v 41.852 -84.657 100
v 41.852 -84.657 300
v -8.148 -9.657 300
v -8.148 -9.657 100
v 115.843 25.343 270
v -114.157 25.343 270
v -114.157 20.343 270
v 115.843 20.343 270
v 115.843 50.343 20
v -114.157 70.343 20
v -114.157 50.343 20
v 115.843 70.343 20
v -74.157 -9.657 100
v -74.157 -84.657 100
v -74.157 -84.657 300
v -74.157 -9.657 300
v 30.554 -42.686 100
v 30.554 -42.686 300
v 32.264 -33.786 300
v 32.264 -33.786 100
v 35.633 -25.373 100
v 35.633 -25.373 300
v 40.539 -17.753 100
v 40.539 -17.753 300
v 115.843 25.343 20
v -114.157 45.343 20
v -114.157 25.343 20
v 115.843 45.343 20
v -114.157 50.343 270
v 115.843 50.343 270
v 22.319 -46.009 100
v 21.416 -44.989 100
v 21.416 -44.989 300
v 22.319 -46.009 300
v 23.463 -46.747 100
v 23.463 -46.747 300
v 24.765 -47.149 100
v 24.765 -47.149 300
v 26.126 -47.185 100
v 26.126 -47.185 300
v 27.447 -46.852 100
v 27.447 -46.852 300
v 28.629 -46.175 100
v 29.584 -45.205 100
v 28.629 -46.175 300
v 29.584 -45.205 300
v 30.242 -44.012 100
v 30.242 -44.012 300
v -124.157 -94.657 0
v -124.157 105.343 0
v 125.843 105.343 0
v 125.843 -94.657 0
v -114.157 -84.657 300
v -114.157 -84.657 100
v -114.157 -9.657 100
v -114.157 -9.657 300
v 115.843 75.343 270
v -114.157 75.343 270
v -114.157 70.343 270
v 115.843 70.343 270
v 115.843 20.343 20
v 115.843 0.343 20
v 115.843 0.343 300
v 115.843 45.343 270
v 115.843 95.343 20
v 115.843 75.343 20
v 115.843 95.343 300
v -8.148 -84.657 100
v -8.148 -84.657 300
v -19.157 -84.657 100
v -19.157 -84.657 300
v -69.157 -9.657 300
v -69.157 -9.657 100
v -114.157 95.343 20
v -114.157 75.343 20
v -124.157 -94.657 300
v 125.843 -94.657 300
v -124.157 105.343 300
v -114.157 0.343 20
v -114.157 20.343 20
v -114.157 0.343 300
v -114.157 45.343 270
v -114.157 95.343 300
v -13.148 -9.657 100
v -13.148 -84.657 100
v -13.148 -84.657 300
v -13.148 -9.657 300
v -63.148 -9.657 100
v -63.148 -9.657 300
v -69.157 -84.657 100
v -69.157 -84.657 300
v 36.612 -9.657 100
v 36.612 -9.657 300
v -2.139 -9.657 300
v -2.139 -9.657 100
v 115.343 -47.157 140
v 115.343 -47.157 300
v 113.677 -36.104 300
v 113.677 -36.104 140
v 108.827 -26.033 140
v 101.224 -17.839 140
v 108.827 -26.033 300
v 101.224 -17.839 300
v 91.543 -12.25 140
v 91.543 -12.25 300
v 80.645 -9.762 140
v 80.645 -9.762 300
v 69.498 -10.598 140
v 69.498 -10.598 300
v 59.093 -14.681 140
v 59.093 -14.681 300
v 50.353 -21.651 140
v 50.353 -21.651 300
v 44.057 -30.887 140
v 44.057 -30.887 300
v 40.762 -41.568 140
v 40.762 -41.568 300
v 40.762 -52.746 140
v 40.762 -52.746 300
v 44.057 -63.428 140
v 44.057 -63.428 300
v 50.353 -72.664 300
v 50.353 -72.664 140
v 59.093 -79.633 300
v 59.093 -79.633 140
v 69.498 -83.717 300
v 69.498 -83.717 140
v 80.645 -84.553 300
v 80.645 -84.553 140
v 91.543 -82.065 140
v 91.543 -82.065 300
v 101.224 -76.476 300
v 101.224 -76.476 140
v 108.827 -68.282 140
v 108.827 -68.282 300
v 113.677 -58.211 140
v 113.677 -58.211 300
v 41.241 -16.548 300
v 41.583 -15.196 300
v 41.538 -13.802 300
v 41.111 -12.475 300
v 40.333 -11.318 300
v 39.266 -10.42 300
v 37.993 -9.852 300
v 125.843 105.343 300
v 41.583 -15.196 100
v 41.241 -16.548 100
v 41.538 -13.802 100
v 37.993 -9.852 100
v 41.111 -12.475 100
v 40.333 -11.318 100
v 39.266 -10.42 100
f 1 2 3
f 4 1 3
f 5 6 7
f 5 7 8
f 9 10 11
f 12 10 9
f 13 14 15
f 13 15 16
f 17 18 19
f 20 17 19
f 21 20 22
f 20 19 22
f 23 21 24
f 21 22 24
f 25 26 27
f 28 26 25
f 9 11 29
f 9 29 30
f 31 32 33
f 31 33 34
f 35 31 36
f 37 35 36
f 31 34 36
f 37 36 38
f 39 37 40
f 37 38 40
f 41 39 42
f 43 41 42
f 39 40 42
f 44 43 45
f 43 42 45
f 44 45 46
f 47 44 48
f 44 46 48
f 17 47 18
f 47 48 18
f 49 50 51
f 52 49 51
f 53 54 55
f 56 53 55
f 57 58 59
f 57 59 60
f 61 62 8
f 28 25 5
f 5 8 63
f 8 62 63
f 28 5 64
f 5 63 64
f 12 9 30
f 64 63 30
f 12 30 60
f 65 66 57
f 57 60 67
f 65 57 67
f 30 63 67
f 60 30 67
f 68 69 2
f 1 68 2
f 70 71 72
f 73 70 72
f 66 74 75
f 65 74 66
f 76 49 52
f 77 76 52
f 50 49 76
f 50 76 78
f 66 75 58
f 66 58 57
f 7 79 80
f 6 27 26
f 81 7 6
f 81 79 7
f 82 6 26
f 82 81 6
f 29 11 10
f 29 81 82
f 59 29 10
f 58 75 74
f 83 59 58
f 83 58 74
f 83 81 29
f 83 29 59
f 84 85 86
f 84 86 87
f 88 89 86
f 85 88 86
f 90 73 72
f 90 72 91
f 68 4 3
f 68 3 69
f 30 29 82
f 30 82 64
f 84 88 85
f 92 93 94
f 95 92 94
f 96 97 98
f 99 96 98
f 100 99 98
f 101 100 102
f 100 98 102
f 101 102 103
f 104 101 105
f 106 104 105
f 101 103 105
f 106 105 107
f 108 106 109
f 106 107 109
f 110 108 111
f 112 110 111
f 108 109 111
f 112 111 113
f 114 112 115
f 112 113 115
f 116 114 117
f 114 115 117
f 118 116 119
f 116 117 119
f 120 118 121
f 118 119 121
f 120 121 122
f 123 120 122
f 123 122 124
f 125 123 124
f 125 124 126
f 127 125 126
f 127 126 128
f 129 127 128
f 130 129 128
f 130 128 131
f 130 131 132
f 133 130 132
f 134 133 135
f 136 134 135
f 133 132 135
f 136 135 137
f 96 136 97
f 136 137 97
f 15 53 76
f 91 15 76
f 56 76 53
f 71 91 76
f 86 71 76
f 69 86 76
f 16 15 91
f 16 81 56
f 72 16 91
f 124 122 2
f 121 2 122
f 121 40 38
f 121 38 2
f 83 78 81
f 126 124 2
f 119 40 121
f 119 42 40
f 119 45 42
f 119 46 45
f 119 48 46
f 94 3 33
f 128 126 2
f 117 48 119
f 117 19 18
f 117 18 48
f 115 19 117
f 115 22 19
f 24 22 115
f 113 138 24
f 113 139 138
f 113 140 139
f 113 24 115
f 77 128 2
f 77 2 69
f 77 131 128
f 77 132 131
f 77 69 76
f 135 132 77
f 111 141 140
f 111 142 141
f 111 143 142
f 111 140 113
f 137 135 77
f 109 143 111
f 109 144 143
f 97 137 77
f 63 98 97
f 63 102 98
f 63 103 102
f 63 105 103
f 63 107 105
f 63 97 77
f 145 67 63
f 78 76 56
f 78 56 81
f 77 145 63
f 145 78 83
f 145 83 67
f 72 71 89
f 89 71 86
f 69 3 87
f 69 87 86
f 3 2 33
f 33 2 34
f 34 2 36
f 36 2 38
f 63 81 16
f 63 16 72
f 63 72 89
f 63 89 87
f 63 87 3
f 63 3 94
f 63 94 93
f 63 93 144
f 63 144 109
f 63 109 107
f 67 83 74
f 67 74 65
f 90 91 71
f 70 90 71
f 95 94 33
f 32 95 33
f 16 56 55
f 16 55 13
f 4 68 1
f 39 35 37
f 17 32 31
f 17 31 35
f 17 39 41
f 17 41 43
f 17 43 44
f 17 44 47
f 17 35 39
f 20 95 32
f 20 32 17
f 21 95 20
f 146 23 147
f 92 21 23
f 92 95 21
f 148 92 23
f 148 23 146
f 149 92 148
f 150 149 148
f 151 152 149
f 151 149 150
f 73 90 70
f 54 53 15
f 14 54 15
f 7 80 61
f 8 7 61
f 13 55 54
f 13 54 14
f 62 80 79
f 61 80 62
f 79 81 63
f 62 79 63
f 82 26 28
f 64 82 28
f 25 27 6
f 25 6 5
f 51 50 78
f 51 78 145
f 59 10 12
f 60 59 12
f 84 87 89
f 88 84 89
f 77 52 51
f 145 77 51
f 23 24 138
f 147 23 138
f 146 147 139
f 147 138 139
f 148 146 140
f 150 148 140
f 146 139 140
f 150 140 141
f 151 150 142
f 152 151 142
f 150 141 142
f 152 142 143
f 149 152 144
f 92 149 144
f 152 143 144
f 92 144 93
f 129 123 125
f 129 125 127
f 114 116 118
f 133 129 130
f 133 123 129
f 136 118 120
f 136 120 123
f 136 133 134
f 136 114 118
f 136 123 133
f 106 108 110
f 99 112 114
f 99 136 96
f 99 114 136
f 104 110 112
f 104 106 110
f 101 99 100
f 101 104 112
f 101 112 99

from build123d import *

# Parameters (mm, degrees)
F0_W     = 250
F0_H     = 200
F1_DEPTH = 300
F2_W     = 230
F2_H     = 20
F3_DEPTH = 280
F4_W     = 230
F4_H     = 55
F5_DEPTH = 30
F6_R     = 37.5
F7_DEPTH = 160
F6_W     = 40
F6_H     = 75
F8_DEPTH = 200


with BuildPart() as f1:
    # F0 (on Top) → F1 (new body)
    with BuildSketch(Plane.XY):
        with Locations((0.84289, 5.342618)):
            Rectangle(F0_W, F0_H)
    extrude(amount=F1_DEPTH)

    # F2 (on face) → F3 (cut)
    with BuildSketch(Plane.XY.offset(300)):
        with Locations((0.84289, 85.342618)):
            Rectangle(F2_W, F2_H)
        with Locations((0.84289, 60.342618)):
            Rectangle(F2_W, F2_H)
        with Locations((0.84289, 35.342618)):
            Rectangle(F2_W, F2_H)
        with Locations((0.84289, 10.342618)):
            Rectangle(F2_W, F2_H)
    extrude(amount=-F3_DEPTH, mode=Mode.SUBTRACT)

    # F4 (on face) → F5 (cut)
    with BuildSketch(Plane.XY.offset(300)):
        with Locations((0.84289, 47.842618)):
            Rectangle(F4_W, F4_H)
    extrude(amount=-F5_DEPTH, mode=Mode.SUBTRACT)

    # F6 (on face) → F7 (cut)
    with BuildSketch(Plane.XY.offset(300)):
        with Locations((77.84289, -47.157382)):
            Circle(F6_R)
    extrude(amount=-F7_DEPTH, mode=Mode.SUBTRACT)

    # F6 (on face) → F8 (cut)
    with BuildSketch(Plane.XY.offset(300)):
        with Locations((-94.15711, -47.157382)):
            Rectangle(F6_W, F6_H)
        Polygon((-19.15711, -84.657382), (-69.15711, -9.657382), (-69.15711, -84.657382), align=None)
        Polygon((-13.147858, -9.657382), (-63.147858, -9.657382), (-13.147858, -84.657382), align=None)
        Polygon((-8.147858, -9.657382), (-8.147858, -84.657382), (41.852142, -84.657382), align=None)
        with BuildLine():
            Line((36.611834, -9.657382), (-2.138606, -9.657382))
            Line((-2.138606, -9.657382), (21.415755, -44.988925))
            ThreePointArc((21.415755, -44.988925), (26.797834, -47.06384), (30.553805, -42.686086))
            ThreePointArc((30.553805, -42.686086), (33.747208, -29.498932), (40.538601, -17.752621))
            ThreePointArc((40.538601, -17.752621), (41.110511, -12.475204), (36.611834, -9.657382))
        make_face()
    extrude(amount=-F8_DEPTH, mode=Mode.SUBTRACT)


solid = f1.part
